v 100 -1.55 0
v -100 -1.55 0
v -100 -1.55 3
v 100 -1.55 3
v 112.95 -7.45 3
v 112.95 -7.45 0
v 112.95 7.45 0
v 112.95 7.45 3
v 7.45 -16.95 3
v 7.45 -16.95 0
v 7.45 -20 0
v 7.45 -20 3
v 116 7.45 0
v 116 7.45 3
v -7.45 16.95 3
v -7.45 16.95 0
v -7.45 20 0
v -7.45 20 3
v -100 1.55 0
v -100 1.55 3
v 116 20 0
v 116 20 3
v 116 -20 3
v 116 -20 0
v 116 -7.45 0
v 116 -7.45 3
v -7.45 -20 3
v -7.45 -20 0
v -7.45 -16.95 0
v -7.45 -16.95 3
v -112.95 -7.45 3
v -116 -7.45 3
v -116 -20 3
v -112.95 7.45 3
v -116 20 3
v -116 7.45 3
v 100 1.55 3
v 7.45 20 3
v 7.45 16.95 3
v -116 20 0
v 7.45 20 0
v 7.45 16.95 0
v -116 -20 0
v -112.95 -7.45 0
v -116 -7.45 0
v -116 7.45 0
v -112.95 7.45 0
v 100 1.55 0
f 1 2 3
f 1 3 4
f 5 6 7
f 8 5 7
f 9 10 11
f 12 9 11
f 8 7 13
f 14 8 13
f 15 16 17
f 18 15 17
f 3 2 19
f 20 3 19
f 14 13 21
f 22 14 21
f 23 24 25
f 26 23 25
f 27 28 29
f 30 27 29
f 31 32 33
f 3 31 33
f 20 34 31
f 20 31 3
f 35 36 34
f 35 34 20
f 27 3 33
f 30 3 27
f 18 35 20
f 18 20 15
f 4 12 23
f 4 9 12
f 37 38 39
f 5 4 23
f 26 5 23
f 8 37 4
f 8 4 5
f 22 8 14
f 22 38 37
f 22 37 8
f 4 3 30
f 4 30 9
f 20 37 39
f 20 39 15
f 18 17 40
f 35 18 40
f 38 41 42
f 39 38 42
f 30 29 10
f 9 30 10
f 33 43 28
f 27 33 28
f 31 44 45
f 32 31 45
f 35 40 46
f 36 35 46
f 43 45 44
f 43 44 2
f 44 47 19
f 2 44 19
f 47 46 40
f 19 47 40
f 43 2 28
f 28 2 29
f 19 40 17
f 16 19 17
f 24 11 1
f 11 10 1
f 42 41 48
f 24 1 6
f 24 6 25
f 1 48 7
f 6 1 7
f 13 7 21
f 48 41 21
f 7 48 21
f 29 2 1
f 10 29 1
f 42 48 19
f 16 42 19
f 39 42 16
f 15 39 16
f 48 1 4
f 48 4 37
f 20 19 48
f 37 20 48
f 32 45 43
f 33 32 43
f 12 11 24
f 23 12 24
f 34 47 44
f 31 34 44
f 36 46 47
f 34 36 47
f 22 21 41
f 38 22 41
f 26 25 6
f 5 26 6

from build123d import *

# Parameters (mm, degrees)
F0_W     = 200
F0_H     = 3.1
F1_DEPTH = 3


with BuildPart() as f1:
    # F0 (on Top) → F1 (new body)
    with BuildSketch(Plane.XY):
        Polygon((7.45, -20), (116, -20), (116, -7.45), (112.95, -7.45), (112.95, 7.45), (116, 7.45), (116, 20), (7.45, 20), (7.45, 16.95), (-7.45, 16.95), (-7.45, 20), (-116, 20), (-116, 7.45), (-112.95, 7.45), (-112.95, -7.45), (-116, -7.45), (-116, -20), (-7.45, -20), (-7.45, -16.95), (7.45, -16.95), align=None)
        Rectangle(F0_W, F0_H, mode=Mode.SUBTRACT)
    extrude(amount=F1_DEPTH)


solid = f1.part
